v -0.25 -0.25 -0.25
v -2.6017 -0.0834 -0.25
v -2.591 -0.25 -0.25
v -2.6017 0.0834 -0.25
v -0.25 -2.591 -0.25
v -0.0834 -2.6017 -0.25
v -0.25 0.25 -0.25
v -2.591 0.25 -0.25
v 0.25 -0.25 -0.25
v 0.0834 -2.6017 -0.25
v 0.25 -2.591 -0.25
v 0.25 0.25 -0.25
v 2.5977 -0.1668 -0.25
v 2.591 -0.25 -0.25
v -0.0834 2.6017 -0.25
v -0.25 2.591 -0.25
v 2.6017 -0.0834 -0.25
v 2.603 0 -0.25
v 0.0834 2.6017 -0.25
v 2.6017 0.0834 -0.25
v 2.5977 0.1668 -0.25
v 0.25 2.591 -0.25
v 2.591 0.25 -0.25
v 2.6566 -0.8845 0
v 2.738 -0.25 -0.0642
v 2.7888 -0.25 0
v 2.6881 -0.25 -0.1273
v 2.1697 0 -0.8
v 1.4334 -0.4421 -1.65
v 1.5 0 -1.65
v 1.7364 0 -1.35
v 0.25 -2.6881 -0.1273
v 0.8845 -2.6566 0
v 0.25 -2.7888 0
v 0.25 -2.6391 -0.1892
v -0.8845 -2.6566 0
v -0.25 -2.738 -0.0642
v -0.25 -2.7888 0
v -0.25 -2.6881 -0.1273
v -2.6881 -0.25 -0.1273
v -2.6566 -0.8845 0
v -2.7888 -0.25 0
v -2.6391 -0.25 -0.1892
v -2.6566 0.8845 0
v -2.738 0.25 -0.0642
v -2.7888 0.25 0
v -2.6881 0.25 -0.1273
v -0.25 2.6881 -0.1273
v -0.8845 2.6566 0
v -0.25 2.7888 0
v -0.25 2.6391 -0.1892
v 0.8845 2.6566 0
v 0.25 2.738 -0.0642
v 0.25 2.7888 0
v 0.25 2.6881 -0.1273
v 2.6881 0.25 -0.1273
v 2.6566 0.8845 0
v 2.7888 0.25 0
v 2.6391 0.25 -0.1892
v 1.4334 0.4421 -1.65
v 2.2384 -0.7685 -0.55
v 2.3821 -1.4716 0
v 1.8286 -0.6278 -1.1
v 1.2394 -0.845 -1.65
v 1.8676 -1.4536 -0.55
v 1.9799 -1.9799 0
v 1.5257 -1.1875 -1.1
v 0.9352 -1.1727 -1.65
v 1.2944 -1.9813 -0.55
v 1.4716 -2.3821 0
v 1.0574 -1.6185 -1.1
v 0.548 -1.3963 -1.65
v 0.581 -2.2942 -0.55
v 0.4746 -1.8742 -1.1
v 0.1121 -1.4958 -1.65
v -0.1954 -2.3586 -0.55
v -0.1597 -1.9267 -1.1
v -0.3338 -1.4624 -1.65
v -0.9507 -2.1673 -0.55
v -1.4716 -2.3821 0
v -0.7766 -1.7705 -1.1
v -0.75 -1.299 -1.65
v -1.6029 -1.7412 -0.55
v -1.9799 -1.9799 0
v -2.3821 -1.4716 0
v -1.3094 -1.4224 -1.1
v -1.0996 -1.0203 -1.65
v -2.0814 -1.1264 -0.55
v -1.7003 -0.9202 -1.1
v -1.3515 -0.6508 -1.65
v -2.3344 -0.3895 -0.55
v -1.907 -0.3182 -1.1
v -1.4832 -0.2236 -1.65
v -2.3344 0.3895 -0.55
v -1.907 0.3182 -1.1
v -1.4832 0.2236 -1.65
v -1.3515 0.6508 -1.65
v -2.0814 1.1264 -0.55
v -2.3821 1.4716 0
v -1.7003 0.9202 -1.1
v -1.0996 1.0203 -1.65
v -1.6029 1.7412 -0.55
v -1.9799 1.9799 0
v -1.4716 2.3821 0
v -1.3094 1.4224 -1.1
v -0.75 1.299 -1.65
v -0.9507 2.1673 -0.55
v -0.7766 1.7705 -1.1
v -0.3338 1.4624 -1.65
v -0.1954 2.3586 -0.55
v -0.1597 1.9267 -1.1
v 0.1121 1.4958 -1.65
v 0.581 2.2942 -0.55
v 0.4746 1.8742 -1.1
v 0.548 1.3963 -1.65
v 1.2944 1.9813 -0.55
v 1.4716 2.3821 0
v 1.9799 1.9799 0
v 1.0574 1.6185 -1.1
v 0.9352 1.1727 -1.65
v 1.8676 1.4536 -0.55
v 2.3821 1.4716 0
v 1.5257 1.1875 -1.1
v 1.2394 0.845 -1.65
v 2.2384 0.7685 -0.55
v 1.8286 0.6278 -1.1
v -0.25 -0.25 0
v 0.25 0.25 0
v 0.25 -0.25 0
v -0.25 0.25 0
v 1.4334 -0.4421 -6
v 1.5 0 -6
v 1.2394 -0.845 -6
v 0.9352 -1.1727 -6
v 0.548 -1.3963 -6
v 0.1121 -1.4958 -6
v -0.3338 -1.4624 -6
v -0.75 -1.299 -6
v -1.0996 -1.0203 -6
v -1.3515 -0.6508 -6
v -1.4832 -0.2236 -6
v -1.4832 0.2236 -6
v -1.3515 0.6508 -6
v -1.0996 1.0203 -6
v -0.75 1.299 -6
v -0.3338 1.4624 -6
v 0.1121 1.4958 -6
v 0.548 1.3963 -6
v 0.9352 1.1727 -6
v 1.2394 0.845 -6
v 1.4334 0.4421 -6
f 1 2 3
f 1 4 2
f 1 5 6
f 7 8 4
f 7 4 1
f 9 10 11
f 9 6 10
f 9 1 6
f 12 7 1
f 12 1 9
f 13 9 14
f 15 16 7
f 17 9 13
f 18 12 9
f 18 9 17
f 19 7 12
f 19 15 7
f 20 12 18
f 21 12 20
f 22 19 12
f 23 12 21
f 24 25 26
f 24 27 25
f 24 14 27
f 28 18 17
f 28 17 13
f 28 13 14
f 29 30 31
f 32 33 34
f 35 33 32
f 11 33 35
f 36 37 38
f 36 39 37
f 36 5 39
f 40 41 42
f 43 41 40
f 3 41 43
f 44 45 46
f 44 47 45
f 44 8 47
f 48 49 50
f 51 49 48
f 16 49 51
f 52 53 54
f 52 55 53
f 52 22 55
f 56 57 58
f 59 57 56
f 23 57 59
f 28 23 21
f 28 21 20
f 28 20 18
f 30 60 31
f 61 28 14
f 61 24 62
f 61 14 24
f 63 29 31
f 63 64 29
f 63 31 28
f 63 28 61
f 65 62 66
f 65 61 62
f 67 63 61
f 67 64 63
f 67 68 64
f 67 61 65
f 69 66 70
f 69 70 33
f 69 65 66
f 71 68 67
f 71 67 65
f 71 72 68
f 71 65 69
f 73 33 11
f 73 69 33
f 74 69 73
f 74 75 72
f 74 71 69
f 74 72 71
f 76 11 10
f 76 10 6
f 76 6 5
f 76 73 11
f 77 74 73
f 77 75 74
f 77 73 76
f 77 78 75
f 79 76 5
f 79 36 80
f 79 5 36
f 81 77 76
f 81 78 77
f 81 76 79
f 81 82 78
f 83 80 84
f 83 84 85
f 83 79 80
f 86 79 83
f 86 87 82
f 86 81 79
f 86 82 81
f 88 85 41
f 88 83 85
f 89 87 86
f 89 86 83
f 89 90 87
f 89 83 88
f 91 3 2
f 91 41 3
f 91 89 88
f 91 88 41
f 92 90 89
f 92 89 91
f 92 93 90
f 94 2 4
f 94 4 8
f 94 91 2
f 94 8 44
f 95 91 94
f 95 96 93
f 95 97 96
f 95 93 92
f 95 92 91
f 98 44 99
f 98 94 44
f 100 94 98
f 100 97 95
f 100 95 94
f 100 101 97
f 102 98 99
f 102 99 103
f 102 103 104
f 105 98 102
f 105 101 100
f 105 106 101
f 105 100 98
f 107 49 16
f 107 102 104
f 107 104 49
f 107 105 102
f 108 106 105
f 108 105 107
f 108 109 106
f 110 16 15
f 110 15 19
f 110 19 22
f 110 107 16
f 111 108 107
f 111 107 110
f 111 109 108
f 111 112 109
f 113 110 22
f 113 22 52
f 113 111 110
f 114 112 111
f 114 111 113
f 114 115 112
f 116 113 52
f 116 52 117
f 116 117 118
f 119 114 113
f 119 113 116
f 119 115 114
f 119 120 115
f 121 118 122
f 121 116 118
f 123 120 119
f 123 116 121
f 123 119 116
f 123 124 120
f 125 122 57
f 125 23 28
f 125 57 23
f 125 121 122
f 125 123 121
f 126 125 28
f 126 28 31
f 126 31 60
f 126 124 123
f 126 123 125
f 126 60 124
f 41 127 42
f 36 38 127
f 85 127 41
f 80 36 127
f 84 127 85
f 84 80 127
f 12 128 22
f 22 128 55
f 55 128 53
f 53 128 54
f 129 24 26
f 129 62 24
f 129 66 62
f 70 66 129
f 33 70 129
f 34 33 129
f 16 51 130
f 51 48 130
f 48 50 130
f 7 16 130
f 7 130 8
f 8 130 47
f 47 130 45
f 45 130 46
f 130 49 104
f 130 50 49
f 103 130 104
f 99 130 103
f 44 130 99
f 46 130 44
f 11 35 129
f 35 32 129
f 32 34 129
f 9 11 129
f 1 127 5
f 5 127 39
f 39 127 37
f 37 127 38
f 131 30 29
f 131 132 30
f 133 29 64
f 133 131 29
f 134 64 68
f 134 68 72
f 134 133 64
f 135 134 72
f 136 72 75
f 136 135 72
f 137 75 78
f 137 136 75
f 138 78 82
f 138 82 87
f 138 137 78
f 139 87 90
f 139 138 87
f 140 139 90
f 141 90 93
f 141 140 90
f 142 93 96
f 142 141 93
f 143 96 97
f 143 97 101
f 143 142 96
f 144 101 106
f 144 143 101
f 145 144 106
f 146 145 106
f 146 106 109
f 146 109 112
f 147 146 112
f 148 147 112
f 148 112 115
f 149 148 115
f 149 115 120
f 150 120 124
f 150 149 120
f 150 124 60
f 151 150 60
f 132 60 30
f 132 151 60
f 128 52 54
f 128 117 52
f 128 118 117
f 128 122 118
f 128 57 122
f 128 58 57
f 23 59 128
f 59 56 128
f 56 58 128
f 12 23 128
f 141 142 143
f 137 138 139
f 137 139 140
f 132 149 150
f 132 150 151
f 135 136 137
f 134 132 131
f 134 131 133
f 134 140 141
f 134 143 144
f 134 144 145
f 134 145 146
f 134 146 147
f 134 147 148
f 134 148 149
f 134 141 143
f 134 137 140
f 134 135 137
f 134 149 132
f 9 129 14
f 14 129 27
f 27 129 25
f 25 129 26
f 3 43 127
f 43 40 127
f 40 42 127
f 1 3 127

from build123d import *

# Parameters (mm, degrees)
CUT_EXTRUDE1_DEPTH = 0.25


with BuildPart() as part:
    # Sketch2 → Revolve1 (revolve)
    with BuildSketch(Plane(origin=(0, 0, 0), x_dir=(0, 0, -1), z_dir=(1, 0, 0)), mode=Mode.PRIVATE) as revolve1_sk:
        Polygon((0, 0), (0, 2.8), (1.65, 1.5), (6, 1.5), (6, 0), align=None)
    revolve(revolve1_sk.sketch.rotate(Axis((0, 0, 0), (0, 0, -1)), 90), axis=Axis((0, 0, 0), (0, 0, -1)))

    # Sketch3 → Cut-Extrude1 (cut)
    with BuildSketch(Plane.XY):
        Polygon((-0.25, 2.8), (-0.25, 0.25), (-2.8, 0.25), (-3.256058343, -0.027319636), (-2.8, -0.25), (-0.25, -0.25), (-0.25, -2.8), (0.125, -3.416695886), (0.25, -2.8), (0.25, -0.25), (2.8, -0.25), (3.211130591, 0), (2.8, 0.25), (0.25, 0.25), (0.25, 2.8), (0, 3.10316335), align=None)
    extrude(amount=-CUT_EXTRUDE1_DEPTH, mode=Mode.SUBTRACT)


solid = part.part
